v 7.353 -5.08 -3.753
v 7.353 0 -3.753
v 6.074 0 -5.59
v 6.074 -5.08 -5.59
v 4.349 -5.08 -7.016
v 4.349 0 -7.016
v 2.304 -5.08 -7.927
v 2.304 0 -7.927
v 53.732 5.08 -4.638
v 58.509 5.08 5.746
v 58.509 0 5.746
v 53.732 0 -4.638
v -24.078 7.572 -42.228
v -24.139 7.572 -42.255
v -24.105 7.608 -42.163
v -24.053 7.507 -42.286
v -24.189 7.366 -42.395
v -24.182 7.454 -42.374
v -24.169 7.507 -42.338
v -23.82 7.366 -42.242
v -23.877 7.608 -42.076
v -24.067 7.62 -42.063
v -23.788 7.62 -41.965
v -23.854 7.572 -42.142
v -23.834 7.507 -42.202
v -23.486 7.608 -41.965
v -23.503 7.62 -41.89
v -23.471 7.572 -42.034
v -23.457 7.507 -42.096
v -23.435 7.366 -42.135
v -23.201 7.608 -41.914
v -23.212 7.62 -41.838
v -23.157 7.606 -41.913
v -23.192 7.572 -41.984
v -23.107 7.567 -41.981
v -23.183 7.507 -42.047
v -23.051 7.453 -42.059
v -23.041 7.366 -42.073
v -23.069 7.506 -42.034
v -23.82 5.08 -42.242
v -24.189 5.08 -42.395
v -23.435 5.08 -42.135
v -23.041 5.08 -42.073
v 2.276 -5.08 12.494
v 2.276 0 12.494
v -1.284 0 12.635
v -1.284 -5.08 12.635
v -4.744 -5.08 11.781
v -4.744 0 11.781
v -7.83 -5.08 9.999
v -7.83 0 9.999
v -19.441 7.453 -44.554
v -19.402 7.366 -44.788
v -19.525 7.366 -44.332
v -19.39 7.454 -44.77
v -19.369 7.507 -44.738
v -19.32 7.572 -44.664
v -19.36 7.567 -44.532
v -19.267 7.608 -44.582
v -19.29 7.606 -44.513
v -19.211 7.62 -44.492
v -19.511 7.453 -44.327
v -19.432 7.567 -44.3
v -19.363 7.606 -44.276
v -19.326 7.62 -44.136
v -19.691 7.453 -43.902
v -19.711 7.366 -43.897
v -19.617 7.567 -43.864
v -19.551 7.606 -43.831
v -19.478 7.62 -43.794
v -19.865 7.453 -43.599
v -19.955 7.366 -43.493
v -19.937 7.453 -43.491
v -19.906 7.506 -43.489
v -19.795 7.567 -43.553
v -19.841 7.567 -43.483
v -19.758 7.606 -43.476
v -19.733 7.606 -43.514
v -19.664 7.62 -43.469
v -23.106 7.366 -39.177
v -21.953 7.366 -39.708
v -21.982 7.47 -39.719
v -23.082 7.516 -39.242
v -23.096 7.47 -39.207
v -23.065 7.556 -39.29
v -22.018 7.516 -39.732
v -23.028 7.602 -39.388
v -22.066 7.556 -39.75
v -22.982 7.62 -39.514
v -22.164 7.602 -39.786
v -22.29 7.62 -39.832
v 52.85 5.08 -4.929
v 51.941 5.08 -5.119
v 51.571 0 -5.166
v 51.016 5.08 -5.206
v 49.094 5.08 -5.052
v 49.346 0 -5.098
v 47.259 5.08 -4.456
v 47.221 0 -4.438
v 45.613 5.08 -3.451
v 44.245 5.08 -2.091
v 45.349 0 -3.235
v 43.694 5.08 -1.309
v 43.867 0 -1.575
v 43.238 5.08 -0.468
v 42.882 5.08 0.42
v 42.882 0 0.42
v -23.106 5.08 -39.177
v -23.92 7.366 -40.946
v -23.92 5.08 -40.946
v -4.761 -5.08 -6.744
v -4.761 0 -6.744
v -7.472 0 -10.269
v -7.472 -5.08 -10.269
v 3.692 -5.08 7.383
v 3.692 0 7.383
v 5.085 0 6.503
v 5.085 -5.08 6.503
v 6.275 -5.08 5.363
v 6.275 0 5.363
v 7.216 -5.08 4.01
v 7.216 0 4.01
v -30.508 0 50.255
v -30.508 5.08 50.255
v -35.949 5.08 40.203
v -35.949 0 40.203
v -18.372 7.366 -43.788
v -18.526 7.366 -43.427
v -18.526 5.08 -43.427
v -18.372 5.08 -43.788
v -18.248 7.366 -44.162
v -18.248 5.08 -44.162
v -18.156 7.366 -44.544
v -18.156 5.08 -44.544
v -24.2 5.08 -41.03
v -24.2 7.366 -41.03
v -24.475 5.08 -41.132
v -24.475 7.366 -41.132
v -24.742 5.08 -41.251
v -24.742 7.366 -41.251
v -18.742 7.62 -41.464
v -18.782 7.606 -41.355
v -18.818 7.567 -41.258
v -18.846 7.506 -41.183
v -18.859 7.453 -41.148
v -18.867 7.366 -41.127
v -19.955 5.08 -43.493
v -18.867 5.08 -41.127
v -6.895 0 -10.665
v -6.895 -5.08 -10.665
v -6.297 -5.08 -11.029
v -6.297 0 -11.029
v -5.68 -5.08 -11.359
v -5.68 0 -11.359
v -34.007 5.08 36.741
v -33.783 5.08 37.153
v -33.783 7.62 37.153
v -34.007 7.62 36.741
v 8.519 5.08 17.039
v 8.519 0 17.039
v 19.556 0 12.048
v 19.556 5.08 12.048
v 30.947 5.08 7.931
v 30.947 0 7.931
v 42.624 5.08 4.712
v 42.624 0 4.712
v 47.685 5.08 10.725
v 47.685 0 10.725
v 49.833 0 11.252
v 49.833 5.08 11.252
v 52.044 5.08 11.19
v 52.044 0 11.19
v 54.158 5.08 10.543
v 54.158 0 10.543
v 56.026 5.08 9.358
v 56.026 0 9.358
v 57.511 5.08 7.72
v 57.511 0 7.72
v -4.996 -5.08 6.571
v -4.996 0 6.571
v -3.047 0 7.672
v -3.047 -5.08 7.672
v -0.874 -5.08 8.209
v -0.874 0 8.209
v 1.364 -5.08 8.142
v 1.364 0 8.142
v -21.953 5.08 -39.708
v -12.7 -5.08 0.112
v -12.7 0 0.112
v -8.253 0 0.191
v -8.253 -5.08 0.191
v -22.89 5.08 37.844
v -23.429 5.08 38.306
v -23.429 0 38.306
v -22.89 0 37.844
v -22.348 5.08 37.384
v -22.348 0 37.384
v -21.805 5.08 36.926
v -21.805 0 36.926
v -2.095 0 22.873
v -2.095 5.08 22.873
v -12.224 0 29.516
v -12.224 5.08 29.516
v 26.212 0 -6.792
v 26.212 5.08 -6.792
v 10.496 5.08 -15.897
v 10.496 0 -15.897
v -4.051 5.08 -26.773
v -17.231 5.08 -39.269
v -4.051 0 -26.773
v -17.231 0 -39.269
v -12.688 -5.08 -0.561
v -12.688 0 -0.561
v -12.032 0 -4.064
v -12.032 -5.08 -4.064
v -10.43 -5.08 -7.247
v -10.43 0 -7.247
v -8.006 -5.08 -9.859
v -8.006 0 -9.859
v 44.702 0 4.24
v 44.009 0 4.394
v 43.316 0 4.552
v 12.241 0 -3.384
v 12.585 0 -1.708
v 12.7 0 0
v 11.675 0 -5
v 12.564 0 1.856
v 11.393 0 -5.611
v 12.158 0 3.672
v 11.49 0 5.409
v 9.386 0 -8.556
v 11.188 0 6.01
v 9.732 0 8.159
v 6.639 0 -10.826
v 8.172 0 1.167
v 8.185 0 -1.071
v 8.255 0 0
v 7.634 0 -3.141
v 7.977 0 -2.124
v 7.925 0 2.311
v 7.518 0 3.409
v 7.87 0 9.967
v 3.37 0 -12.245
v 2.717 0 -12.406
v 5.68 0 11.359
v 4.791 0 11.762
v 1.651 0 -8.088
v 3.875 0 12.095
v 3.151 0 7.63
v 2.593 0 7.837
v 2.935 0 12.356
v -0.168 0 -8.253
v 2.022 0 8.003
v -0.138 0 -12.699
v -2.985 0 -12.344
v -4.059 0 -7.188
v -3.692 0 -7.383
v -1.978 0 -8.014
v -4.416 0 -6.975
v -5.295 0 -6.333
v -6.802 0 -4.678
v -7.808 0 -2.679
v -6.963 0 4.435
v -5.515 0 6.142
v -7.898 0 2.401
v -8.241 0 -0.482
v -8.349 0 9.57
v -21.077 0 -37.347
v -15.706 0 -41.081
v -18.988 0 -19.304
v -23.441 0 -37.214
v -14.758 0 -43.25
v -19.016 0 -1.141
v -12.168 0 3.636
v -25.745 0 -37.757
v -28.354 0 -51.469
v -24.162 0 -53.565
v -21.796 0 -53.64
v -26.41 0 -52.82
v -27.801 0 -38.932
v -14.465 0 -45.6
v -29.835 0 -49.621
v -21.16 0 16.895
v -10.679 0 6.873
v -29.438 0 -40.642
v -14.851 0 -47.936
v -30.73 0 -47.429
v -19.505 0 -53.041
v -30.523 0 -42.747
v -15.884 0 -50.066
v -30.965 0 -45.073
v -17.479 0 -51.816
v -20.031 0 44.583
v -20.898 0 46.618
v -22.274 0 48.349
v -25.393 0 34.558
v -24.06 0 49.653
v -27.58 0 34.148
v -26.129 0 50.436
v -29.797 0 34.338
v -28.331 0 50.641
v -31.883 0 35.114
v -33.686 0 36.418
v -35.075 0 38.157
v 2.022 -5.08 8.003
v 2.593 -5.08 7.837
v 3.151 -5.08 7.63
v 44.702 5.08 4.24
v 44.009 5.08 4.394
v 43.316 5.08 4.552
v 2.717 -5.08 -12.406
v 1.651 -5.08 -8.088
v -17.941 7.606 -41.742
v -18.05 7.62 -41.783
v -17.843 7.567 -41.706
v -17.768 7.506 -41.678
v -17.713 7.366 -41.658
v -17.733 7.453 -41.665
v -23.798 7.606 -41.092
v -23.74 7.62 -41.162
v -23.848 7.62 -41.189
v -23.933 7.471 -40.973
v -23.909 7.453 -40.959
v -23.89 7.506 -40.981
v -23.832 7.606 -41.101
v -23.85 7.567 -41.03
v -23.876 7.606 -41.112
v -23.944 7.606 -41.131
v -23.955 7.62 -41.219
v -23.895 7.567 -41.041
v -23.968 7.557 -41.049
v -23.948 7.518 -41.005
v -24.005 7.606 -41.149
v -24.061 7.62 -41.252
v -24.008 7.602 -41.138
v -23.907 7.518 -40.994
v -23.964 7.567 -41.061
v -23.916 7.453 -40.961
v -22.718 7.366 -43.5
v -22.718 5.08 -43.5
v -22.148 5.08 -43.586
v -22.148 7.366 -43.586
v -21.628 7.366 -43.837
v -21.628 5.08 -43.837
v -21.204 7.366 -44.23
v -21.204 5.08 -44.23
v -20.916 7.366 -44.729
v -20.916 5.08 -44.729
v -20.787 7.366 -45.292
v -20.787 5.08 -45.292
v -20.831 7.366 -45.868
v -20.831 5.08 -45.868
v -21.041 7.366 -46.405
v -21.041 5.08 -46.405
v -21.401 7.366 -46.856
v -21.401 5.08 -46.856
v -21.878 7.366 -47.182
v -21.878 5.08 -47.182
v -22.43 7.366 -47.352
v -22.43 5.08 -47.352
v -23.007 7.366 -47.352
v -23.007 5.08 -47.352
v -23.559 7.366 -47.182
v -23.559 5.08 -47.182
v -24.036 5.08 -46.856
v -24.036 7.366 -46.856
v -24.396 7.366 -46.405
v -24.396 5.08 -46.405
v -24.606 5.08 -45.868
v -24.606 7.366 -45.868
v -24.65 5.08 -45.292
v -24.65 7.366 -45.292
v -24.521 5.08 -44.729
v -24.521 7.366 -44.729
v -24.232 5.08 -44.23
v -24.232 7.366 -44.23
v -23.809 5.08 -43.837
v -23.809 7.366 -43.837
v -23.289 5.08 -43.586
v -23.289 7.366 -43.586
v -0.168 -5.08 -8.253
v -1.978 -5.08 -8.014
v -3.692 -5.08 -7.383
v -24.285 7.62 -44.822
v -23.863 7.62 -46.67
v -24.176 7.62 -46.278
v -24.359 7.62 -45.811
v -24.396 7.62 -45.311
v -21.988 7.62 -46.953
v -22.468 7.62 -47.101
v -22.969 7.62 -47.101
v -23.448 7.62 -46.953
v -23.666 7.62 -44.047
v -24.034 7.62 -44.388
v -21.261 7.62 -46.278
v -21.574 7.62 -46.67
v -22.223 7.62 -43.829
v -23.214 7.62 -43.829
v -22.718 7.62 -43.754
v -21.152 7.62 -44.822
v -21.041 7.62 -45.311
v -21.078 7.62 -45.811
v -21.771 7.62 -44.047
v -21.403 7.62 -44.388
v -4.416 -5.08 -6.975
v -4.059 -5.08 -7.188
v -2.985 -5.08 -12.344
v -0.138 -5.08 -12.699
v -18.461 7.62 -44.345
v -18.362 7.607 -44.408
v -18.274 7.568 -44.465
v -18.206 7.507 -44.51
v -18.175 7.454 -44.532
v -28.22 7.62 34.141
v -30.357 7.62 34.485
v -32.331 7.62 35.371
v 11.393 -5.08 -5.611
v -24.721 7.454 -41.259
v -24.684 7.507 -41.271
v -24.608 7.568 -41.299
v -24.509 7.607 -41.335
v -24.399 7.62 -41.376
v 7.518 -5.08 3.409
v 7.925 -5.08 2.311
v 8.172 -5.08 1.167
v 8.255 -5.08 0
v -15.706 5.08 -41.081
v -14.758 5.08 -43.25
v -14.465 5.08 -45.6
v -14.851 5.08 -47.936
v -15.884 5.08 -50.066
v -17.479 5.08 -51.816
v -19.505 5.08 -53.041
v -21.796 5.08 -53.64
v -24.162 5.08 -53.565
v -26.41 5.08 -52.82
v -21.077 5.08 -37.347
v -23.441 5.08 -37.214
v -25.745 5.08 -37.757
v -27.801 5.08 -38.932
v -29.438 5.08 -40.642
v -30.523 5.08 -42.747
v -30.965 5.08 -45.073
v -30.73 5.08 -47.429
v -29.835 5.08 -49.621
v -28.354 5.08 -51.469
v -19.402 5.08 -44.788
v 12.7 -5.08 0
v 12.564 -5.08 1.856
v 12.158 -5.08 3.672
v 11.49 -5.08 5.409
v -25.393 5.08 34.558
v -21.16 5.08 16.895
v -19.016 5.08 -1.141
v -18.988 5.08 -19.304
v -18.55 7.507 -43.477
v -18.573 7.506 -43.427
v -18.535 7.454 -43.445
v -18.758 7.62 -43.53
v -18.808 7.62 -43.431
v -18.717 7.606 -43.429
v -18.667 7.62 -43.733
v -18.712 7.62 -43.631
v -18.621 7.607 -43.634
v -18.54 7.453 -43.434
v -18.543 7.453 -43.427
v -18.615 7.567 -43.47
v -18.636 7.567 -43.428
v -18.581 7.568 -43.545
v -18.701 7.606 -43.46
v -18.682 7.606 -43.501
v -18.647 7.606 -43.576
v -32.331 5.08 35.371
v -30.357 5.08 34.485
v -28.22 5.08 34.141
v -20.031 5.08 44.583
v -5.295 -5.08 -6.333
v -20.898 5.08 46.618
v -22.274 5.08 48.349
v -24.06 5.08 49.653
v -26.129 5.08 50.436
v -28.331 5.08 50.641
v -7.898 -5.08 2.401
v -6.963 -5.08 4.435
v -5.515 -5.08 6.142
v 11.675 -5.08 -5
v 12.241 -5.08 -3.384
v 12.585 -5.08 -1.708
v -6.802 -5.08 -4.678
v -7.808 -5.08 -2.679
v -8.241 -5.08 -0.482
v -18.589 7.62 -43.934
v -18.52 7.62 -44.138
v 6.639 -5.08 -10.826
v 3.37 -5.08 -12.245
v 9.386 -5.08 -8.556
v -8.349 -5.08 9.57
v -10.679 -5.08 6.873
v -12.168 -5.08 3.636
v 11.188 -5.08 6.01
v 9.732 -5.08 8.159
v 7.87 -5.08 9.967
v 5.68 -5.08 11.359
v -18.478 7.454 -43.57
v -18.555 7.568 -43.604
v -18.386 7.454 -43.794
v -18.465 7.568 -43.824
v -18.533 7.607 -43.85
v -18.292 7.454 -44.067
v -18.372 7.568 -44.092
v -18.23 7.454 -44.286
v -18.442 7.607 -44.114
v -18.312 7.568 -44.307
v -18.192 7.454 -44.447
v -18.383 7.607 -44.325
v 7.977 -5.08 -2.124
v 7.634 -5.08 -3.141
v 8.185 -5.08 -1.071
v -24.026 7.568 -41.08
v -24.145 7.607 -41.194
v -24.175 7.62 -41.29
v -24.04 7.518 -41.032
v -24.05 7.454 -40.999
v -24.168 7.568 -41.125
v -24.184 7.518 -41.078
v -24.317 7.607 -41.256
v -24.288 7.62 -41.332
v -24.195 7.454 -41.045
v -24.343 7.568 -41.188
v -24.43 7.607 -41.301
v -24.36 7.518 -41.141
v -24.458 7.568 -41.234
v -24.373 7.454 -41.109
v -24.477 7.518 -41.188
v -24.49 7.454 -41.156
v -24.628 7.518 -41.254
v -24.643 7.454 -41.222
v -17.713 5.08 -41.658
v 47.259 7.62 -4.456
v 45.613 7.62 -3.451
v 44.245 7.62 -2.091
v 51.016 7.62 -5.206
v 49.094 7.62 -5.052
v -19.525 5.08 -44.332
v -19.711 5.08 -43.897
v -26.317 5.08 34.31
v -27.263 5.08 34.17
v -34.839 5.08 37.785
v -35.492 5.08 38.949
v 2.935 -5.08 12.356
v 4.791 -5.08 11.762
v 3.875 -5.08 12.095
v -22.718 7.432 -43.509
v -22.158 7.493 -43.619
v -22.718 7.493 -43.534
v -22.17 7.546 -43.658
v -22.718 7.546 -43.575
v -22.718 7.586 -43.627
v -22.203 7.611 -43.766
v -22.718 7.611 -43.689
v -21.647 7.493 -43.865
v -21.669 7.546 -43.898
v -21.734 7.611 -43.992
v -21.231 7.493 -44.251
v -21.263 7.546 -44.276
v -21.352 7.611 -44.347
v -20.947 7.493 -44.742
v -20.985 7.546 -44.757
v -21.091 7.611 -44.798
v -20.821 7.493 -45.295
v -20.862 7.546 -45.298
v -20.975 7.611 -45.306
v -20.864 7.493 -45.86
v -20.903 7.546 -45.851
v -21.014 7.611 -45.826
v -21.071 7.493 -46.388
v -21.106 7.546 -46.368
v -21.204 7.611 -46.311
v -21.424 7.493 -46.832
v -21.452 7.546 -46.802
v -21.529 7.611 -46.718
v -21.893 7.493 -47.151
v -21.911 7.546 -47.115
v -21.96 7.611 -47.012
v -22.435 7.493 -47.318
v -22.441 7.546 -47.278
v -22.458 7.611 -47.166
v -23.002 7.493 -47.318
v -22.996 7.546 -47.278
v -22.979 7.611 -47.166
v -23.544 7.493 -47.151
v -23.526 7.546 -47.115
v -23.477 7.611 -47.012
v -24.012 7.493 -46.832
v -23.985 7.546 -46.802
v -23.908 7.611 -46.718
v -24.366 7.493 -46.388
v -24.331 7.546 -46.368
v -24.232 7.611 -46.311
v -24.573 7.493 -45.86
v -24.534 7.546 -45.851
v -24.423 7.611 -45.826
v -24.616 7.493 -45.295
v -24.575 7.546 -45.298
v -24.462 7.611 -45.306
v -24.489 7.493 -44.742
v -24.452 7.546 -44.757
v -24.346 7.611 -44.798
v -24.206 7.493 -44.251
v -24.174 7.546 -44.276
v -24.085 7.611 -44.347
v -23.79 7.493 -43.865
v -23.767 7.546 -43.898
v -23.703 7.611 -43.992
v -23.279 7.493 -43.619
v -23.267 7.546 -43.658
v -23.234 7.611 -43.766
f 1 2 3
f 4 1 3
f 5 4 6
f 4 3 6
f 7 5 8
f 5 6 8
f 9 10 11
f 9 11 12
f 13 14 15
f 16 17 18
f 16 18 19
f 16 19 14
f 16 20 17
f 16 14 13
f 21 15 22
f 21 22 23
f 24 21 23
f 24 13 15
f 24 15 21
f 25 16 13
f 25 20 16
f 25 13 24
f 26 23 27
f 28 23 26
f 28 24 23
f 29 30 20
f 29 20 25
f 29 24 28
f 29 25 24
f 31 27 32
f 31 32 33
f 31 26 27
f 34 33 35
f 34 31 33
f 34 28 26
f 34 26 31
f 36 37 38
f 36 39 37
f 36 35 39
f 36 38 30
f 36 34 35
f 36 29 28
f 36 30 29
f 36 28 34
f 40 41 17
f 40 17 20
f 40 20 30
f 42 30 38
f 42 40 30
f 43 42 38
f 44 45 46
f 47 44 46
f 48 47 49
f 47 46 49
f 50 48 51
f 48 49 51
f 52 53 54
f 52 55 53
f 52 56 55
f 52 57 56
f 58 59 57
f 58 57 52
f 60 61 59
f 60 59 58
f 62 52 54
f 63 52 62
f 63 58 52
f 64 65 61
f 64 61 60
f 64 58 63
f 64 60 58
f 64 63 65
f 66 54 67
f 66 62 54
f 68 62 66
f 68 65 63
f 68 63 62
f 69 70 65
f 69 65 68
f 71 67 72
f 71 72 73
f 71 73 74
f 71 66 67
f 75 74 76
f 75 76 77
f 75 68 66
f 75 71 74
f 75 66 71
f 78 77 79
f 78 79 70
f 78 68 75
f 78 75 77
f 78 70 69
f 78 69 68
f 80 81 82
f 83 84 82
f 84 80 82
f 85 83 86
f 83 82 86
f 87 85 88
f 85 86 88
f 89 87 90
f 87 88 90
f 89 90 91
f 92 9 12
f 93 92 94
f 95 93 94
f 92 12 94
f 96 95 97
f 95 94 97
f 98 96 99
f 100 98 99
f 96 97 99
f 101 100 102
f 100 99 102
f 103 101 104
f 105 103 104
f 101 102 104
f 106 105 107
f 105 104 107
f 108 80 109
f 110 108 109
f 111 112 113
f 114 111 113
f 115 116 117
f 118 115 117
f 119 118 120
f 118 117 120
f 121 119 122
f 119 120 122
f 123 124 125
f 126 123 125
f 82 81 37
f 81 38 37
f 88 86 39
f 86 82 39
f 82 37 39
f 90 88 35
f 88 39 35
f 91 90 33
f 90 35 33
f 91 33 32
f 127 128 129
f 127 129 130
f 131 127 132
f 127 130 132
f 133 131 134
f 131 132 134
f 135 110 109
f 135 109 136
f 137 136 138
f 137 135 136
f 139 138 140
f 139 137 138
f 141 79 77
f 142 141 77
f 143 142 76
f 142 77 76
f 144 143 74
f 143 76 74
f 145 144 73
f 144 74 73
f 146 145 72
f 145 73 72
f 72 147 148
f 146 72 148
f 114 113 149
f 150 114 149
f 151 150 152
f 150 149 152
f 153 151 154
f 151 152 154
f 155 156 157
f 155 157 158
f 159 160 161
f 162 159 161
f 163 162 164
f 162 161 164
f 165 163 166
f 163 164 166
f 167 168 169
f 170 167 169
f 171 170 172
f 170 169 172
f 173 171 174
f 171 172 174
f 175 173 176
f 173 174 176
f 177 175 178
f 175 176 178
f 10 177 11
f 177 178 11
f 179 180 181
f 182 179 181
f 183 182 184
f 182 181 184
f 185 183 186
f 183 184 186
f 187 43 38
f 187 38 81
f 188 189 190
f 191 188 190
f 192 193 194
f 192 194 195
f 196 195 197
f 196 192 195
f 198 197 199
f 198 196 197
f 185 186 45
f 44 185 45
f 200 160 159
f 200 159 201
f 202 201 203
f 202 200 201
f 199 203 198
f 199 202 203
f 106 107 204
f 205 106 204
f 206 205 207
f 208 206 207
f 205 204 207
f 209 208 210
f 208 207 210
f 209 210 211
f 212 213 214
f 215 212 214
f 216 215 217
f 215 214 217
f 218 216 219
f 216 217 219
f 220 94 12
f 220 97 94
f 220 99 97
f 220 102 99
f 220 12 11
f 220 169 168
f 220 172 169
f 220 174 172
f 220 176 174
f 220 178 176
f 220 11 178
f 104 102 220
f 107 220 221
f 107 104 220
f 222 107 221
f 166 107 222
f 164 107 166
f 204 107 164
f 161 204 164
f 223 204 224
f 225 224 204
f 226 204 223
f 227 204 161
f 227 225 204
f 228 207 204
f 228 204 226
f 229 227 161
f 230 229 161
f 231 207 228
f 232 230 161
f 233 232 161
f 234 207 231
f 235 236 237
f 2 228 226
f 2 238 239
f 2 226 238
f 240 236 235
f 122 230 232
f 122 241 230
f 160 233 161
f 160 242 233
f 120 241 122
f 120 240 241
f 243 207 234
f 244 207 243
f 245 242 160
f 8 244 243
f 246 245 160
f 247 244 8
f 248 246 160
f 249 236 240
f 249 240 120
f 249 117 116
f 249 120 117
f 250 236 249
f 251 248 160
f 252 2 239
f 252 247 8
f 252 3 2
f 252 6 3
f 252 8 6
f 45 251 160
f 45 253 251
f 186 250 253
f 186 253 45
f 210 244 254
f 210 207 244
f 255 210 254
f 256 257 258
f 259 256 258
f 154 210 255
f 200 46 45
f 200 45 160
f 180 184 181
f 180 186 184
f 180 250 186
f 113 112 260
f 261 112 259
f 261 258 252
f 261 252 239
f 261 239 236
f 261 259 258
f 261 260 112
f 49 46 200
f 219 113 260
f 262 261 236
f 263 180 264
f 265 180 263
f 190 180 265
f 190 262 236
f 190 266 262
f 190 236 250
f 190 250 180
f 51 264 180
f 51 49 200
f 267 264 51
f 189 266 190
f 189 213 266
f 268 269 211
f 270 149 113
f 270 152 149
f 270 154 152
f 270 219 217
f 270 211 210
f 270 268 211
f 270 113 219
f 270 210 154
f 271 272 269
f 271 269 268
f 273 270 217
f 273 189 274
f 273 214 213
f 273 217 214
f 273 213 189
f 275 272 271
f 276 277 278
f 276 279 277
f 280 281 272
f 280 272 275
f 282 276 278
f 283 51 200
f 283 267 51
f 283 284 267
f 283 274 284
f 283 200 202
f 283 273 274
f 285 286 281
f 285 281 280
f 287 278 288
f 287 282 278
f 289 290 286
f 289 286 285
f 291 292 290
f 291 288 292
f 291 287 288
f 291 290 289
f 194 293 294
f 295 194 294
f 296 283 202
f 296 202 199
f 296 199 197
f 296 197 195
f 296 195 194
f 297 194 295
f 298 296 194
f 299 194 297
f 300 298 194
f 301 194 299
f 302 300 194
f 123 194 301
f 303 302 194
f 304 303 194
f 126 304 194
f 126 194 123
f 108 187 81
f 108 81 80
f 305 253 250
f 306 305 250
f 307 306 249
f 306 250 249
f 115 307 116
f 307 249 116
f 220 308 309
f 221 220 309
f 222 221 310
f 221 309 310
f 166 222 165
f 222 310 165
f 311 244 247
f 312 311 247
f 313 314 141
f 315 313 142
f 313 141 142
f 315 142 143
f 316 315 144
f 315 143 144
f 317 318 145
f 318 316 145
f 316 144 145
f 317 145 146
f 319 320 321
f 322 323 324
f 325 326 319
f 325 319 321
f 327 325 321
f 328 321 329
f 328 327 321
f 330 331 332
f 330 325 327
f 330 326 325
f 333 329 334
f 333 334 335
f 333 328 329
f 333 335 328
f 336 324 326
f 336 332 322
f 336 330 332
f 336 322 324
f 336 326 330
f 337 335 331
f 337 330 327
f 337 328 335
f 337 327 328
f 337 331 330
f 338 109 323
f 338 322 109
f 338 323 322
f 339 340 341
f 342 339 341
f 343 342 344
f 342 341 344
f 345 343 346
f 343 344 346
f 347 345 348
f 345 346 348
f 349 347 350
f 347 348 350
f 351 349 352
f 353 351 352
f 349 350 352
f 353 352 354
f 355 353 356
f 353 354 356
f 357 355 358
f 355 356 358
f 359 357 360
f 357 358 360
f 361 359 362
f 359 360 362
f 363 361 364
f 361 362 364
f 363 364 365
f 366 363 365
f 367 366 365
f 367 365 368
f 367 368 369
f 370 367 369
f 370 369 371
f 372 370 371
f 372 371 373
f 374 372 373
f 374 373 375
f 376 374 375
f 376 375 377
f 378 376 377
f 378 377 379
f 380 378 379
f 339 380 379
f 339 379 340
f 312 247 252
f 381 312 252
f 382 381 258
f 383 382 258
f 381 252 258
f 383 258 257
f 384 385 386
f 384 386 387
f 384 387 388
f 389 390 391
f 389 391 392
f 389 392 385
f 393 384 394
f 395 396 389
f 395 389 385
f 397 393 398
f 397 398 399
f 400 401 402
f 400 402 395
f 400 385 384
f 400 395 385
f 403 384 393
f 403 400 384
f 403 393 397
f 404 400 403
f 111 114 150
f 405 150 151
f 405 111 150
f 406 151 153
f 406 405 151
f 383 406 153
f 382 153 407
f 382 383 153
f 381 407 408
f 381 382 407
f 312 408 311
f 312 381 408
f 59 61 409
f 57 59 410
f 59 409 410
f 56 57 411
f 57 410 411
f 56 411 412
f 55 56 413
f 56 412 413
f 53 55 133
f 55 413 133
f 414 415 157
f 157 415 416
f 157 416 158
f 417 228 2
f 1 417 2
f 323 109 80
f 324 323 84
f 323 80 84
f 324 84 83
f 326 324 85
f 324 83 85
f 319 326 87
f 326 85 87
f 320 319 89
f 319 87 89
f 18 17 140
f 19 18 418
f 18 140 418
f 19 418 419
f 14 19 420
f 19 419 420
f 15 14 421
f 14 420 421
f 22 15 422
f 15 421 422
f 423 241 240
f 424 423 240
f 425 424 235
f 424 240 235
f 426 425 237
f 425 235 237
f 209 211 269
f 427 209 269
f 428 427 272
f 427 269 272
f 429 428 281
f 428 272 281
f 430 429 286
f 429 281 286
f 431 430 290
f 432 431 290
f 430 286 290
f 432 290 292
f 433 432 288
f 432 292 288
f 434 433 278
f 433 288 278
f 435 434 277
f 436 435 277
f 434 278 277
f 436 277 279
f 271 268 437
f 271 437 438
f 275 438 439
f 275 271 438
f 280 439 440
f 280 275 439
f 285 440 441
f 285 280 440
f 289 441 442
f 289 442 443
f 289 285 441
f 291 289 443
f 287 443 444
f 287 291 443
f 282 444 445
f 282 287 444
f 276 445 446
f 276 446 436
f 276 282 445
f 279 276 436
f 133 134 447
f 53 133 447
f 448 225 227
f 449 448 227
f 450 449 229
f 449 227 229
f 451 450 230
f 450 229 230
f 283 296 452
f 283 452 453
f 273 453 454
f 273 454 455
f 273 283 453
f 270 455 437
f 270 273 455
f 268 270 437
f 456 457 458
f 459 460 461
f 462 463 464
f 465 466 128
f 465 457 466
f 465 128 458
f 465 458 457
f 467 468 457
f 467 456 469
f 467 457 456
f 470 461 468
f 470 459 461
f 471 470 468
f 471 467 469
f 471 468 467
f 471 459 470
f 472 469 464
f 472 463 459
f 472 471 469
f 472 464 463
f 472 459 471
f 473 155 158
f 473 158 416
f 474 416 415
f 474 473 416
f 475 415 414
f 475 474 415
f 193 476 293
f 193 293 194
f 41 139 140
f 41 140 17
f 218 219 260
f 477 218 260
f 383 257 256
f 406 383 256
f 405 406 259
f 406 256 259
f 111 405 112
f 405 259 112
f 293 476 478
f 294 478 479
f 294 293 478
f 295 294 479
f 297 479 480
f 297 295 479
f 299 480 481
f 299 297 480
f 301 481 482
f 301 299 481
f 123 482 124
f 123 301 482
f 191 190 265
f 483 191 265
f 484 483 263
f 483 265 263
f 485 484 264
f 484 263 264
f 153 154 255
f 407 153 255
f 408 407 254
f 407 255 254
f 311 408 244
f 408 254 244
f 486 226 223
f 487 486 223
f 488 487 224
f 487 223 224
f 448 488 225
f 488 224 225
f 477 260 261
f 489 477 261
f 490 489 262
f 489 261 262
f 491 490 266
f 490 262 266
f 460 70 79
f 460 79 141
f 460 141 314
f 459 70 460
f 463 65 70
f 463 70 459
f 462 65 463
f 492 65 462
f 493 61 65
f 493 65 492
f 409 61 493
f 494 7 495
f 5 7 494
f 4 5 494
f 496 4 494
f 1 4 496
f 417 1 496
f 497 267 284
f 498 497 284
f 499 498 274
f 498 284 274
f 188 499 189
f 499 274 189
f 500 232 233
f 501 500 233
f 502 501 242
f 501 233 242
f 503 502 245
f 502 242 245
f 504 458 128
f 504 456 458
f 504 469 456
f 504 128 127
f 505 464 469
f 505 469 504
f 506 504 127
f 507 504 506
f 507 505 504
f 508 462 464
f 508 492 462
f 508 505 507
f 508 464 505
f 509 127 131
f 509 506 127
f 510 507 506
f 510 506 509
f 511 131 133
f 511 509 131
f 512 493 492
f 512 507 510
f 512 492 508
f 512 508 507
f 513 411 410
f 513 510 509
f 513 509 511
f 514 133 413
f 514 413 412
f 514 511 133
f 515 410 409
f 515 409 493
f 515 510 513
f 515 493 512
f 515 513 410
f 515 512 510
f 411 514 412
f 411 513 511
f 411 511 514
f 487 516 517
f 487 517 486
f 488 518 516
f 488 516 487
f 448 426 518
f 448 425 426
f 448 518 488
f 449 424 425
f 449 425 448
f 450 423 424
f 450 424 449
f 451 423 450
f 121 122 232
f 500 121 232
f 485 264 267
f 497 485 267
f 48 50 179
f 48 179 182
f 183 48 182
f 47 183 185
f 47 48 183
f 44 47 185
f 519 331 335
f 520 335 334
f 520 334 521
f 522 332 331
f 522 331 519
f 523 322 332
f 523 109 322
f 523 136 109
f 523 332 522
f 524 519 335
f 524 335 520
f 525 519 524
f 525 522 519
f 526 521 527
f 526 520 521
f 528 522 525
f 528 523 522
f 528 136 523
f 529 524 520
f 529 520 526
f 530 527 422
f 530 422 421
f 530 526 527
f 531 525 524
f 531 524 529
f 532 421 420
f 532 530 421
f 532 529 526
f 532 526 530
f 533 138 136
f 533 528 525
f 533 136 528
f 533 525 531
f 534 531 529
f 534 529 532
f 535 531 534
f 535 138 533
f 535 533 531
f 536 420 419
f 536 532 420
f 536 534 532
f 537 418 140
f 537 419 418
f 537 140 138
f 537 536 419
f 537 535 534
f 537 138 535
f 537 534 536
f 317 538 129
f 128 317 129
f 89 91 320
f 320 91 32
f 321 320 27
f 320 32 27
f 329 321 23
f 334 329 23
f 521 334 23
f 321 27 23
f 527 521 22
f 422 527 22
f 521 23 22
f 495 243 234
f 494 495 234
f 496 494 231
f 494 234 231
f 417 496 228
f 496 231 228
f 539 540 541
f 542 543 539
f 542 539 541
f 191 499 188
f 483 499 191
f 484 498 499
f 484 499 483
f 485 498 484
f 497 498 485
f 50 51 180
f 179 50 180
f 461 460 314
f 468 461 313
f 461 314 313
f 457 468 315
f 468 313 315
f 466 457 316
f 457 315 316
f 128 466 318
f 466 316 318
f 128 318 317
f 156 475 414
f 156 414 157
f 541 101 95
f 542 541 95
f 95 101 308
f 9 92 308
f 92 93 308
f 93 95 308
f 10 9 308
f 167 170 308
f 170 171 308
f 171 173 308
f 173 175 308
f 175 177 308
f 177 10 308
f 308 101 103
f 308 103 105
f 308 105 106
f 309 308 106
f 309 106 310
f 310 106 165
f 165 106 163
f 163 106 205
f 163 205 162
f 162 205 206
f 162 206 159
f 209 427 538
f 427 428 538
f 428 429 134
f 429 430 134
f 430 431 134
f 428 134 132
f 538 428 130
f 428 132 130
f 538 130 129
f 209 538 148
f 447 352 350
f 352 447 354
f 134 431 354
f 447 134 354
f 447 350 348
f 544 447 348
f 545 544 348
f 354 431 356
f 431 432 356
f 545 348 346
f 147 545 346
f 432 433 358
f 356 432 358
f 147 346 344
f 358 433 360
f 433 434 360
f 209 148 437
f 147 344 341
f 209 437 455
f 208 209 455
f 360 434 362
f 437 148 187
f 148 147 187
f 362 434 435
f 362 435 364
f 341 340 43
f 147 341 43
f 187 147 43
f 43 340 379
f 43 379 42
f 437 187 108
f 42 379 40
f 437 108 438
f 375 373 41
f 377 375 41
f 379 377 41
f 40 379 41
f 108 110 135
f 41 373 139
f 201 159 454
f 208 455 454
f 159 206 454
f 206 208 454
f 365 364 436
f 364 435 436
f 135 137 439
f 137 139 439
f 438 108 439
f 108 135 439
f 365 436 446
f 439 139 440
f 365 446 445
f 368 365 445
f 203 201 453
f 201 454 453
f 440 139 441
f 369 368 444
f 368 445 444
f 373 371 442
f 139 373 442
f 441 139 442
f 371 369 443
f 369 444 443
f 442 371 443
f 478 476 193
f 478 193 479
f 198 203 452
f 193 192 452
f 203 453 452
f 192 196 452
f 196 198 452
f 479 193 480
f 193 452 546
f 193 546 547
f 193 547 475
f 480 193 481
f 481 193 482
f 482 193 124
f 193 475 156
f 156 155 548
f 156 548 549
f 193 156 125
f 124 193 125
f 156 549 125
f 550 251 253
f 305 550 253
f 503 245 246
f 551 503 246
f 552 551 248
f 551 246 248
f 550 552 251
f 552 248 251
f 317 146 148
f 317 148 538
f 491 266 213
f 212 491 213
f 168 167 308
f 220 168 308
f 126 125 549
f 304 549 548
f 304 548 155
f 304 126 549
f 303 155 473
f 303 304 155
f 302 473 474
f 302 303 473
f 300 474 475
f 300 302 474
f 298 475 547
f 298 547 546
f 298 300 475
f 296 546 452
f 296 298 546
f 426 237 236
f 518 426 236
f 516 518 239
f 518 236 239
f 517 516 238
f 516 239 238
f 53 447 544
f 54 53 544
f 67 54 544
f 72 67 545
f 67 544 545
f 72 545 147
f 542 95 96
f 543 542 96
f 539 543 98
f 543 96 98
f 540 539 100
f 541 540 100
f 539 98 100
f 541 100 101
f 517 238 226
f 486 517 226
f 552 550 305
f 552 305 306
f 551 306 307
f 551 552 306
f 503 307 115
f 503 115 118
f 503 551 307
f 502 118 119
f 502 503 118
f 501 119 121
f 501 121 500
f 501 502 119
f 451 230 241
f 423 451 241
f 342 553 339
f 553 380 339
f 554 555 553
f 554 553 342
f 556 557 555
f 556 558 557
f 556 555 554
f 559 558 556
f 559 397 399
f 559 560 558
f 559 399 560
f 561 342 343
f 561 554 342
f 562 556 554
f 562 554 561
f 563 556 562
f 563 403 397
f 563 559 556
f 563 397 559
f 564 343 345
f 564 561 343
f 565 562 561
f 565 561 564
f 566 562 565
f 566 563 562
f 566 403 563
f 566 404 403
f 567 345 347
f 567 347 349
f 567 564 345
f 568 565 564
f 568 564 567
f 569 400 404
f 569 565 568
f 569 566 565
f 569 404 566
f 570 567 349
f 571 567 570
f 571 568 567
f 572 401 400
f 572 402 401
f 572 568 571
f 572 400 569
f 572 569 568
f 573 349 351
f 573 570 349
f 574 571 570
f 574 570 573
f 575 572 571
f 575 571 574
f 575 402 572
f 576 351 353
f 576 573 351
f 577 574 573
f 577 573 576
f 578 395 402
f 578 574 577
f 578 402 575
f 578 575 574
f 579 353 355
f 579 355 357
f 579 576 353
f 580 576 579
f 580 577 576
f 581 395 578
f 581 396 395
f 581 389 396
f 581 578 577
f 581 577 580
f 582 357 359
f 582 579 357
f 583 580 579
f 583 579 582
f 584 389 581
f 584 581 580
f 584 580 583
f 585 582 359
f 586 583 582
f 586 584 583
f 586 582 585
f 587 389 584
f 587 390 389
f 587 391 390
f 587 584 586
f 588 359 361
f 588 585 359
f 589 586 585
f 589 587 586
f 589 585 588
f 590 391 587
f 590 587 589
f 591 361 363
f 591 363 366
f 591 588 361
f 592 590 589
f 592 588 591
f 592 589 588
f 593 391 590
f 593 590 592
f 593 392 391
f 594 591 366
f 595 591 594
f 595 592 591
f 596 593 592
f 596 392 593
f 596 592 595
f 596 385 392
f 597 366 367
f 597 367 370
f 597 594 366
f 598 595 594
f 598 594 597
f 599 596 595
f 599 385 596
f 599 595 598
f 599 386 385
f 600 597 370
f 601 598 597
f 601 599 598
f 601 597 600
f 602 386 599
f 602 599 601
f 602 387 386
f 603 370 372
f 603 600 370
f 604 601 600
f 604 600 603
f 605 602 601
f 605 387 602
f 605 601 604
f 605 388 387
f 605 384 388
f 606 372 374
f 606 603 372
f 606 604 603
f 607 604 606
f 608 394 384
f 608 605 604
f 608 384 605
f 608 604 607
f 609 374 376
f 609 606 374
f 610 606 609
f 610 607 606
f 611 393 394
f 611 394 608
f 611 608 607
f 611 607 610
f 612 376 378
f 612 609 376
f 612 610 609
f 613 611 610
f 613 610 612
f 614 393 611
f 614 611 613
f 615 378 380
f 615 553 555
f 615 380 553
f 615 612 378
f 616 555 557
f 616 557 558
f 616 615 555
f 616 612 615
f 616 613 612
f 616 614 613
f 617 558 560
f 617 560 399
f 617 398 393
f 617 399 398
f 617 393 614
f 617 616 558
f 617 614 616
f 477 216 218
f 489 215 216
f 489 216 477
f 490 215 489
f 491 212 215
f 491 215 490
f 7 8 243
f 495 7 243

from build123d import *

# Parameters (mm, degrees)
SKETCH2_R           = 8.255
BOSS_EXTRUDE1_DEPTH = 5.08
CUT_EXTRUDE1_DEPTH  = 80.908377803
BOSS_EXTRUDE2_DEPTH = 5.08
SKETCH8_R           = 1.9365
BOSS_EXTRUDE4_DEPTH = 2.54
FILLET1_R           = 0.254


with BuildPart() as part:
    # Sketch2 → Boss-Extrude1 (new body)
    with BuildSketch(Plane(origin=(0, 0, 0), x_dir=(1, 0, 0), z_dir=(0, 1, 0))):
        with Locations((50.708736123, -3.043695253)):
            Circle(SKETCH2_R)
        with BuildLine():
            Line((-26.410198882, 52.820397765), (8.519418994, -17.038837989))
            ThreePointArc((8.519418994, -17.038837989), (29.111674539, -8.526738277), (50.708736123, -3.043695253))
            ThreePointArc((50.708736123, -3.043695253), (13.970978455, 13.668941274), (-17.231396722, 39.269465517))
            ThreePointArc((-17.231396722, 39.269465517), (-15.883780079, 50.066404858), (-26.410198882, 52.820397765))
        make_face()
    boss_extrude1 = extrude(amount=BOSS_EXTRUDE1_DEPTH)

    # Sketch5 → Cut-Extrude1 (cut, through all)
    with BuildSketch(Plane(origin=(0, 5.08, 0), x_dir=(1, 0, 0), z_dir=(0, 1, 0))):
        with BuildLine():
            Line((58.508737367, -5.746472638), (53.73227101, 4.637662817))
            ThreePointArc((53.73227101, 4.637662817), (58.208389507, 0.405974894), (58.508737367, -5.746472638))
        make_face()
        with BuildLine():
            Line((47.685201237, -10.725053322), (44.702333378, -4.240237651))
            ThreePointArc((44.702333378, -4.240237651), (43.662385588, -4.472512868), (42.624053092, -4.711905455))
            ThreePointArc((42.624053092, -4.711905455), (44.393072013, -8.359465362), (47.685201237, -10.725053322))
        make_face()
    cut_extrude1 = extrude(amount=-CUT_EXTRUDE1_DEPTH, mode=Mode.SUBTRACT)

    # Mirror4: Boss-Extrude1, Cut-Extrude1 across plane
    add(boss_extrude1.mirror(Plane(origin=(0, 5.08, 0), x_dir=(0.4472135954999568, 0, 0.8944271909999164), z_dir=(0.8944271909999165, 0, -0.4472135954999568))))
    add(cut_extrude1.mirror(Plane(origin=(0, 5.08, 0), x_dir=(0.4472135954999568, 0, 0.8944271909999164), z_dir=(0.8944271909999165, 0, -0.4472135954999568))), mode=Mode.SUBTRACT)

    # Sketch3 → Boss-Extrude2 (add)
    with BuildSketch(Plane.XZ):
        with BuildLine():
            Line((-7.830396175, 9.998744708), (-4.996450265, 6.571187849))
            ThreePointArc((-4.996450265, 6.571187849), (-1.978896677, 8.01429928), (1.363556525, 8.141605407))
            Line((1.363556525, 8.141605407), (2.276392011, 12.494320286))
            ThreePointArc((2.276392011, 12.494320286), (-3.044456426, 12.329691199), (-7.830396175, 9.998744708))
        make_face()
        with BuildLine():
            Line((2.935161238, 12.356165607), (2.022325752, 8.003450728))
            ThreePointArc((2.022325752, 8.003450728), (2.873803437, 7.738622539), (3.691748231, 7.383496462))
            Line((3.691748231, 7.383496462), (5.679612663, 11.359225326))
            ThreePointArc((5.679612663, 11.359225326), (4.336133626, 11.936831455), (2.935161238, 12.356165607))
        make_face()
        with BuildLine():
            ThreePointArc((3.691748231, 7.383496462), (5.70850704, 5.963050593), (7.215527013, 4.010136523))
            Line((7.215527013, 4.010136523), (11.187760156, 6.010326339))
            ThreePointArc((11.187760156, 6.010326339), (8.847584221, 9.110996293), (5.679612663, 11.359225326))
            Line((5.679612663, 11.359225326), (3.691748231, 7.383496462))
        make_face()
        with BuildLine():
            ThreePointArc((8.255, 0), (8.09827691, -1.600917263), (7.63405849, -3.141046955))
            Line((7.63405849, -3.141046955), (11.674516714, -4.99956593))
            ThreePointArc((11.674516714, -4.99956593), (12.440987949, -2.551826574), (12.7, 0))
            ThreePointArc((12.7, 0), (12.39393251, 2.771360123), (11.490482373, 5.409141784))
            Line((11.490482373, 5.409141784), (7.51824923, 3.408951968))
            ThreePointArc((7.51824923, 3.408951968), (8.068710318, 1.743828777), (8.255, 0))
        make_face()
        with BuildLine():
            Line((11.393235918, -5.611076129), (7.352777693, -3.752557154))
            ThreePointArc((7.352777693, -3.752557154), (5.260198437, -6.362023059), (2.303988218, -7.92695801))
            Line((2.303988218, -7.92695801), (3.370124071, -12.244683081))
            ThreePointArc((3.370124071, -12.244683081), (8.092612979, -9.787727784), (11.393235918, -5.611076129))
        make_face()
        with BuildLine():
            Line((2.716650437, -12.406039271), (1.650514584, -8.088314201))
            ThreePointArc((1.650514584, -8.088314201), (-1.07974567, -8.18408054), (-3.691748231, -7.383496462))
            Line((-3.691748231, -7.383496462), (-5.679612663, -11.359225326))
            ThreePointArc((-5.679612663, -11.359225326), (-1.571222819, -12.602430672), (2.716650437, -12.406039271))
        make_face()
        with BuildLine():
            Line((-5.679612663, -11.359225326), (-3.691748231, -7.383496462))
            ThreePointArc((-3.691748231, -7.383496462), (-4.238479263, -7.083806783), (-4.761032175, -6.743708003))
            Line((-4.761032175, -6.743708003), (-7.472040736, -10.269304126))
            ThreePointArc((-7.472040736, -10.269304126), (-6.598369408, -10.851337298), (-5.679612663, -11.359225326))
        make_face()
        with BuildLine():
            Line((-8.005628232, -9.859001806), (-5.294619671, -6.333405683))
            ThreePointArc((-5.294619671, -6.333405683), (-7.373018127, -3.712630966), (-8.240898233, -0.482308323))
            Line((-8.240898233, -0.482308323), (-12.687606467, -0.560929709))
            ThreePointArc((-12.687606467, -0.560929709), (-11.343104811, -5.711739948), (-8.005628232, -9.859001806))
        make_face()
        with BuildLine():
            Line((-12.699505558, 0.112065107), (-8.252797323, 0.190686492))
            ThreePointArc((-8.252797323, 0.190686492), (-7.499653384, 3.449670147), (-5.515199838, 6.142279361))
            Line((-5.515199838, 6.142279361), (-8.349145748, 9.56983622))
            ThreePointArc((-8.349145748, 9.56983622), (-11.537928283, 5.307184842), (-12.699505558, 0.112065107))
        make_face()
    extrude(amount=BOSS_EXTRUDE2_DEPTH)

    # Sketch8 → Boss-Extrude4 (add)
    with BuildSketch(Plane(origin=(0, 5.08, 0), x_dir=(1, 0, 0), z_dir=(0, 1, 0))):
        with Locations(Location((-22.718450651, 45.436901303, 0), (0, 0, 270))):
            Circle(SKETCH8_R)
        with BuildLine():
            Line((44.245017522, 2.091026438), (51.016120308, 5.205579865))
            ThreePointArc((51.016120308, 5.205579865), (47.259065976, 4.455958131), (44.245017522, 2.091026438))
        make_face()
        with BuildLine():
            Line((-28.219831663, -34.141398155), (-33.783449428, -37.153243515))
            Line((-33.783449428, -37.153243515), (-34.006657305, -36.740923771))
            ThreePointArc((-34.006657305, -36.740923771), (-31.372925912, -34.863081971), (-28.219831663, -34.141398155))
        make_face()
        with BuildLine():
            Line((-23.106493475, 39.17694603), (-23.920173634, 40.945903321))
            ThreePointArc((-23.920173634, 40.945903321), (-24.338189112, 41.07918994), (-24.741778068, 41.25128938))
            Line((-24.741778068, 41.25128938), (-24.189051499, 42.394702403))
            ThreePointArc((-24.189051499, 42.394702403), (-23.62923703, 42.182963815), (-23.040846879, 42.073316657))
            Line((-23.040846879, 42.073316657), (-21.952700646, 39.707664514))
            Line((-21.952700646, 39.707664514), (-23.106493475, 39.17694603))
        make_face()
        with BuildLine():
            Line((-18.155964663, 44.544196083), (-19.402331023, 44.788062641))
            ThreePointArc((-19.402331023, 44.788062641), (-19.610293029, 44.111383595), (-19.954678188, 43.49288413))
            Line((-19.954678188, 43.49288413), (-18.866531955, 41.127231987))
            Line((-18.866531955, 41.127231987), (-17.712739127, 41.657950471))
            Line((-17.712739127, 41.657950471), (-18.526419286, 43.426907762))
            ThreePointArc((-18.526419286, 43.426907762), (-18.305687705, 43.97377992), (-18.155964663, 44.544196083))
        make_face()
    extrude(amount=BOSS_EXTRUDE4_DEPTH)

    # Fillet1
    # the kernel refuses this fillet: 0.254 mm, written as the material it takes off along each edge
    with BuildSketch(Plane(origin=(-22.718450651, 7.62, -45.436901303), x_dir=(0, 0, 1), z_dir=(-1, 0, 0))) as fillet1_piece_1:
        with BuildLine():
            CenterArc((1.9365 - FILLET1_R, -FILLET1_R), FILLET1_R, 0, 90)
            Line((1.9365 - FILLET1_R, 0), (1.9365, 0))
            Line((1.9365, 0), (1.9365, -FILLET1_R))
        make_face()
    revolve(axis=Axis((-22.718450651, 7.62, -45.436901303), (0, 1, 0)), mode=Mode.SUBTRACT)
    with BuildSketch(Plane(origin=(-22.718450651, 7.62, -45.436901303), x_dir=(0.8344364668114368, 0, 0.5511041488278291), z_dir=(-0.5511041488278291, 0, 0.8344364668114368))) as fillet1_piece_2_section:
        with BuildLine():
            CenterArc((4.649 - FILLET1_R, -FILLET1_R), FILLET1_R, 0, 90)
            Line((4.649 - FILLET1_R, 0), (4.649, 0))
            Line((4.649, 0), (4.649, -FILLET1_R))
        make_face()
    fillet1_piece_2 = revolve(axis=Axis((-22.718450651, 7.62, -45.436901303), (0, 1, 0)), revolution_arc=30.198076812, mode=Mode.PRIVATE)
    fillet1_piece_2 = split(fillet1_piece_2, bisect_by=Plane(origin=(-18.824875628, 7.561246822, -44.075757948), z_dir=(0.9084982899729419, 0, -0.4178885702148846)), keep=Keep.TOP, mode=Mode.PRIVATE)
    add(fillet1_piece_2, mode=Mode.SUBTRACT)
    with BuildSketch(Plane(origin=(-19.44342837, 7.62, -40.861872745), x_dir=(0, -1, 0), z_dir=(0.9084982899729457, 0, -0.4178885702148762)), Plane(origin=(-17.532781484, 7.62, -44.422262804), x_dir=(0, -1, 0), z_dir=(-0.9813908341478762, 0, -0.19202091201360277))) as fillet1_piece_3:
        with BuildLine():
            CenterArc((FILLET1_R, FILLET1_R), FILLET1_R, 180, 90)
            Line((0, FILLET1_R), (0, 0))
            Line((0, 0), (FILLET1_R, 0))
        make_face()
    extrude(amount=2.54, mode=Mode.SUBTRACT)
    with BuildSketch(Plane(origin=(-22.718450651, 7.62, -45.436901303), x_dir=(0.9999860071665359, 0, 0.005290129594736052), z_dir=(0.005290129594736052, 0, -0.9999860071665359))) as fillet1_piece_4:
        with BuildLine():
            CenterArc((3.379 + FILLET1_R, FILLET1_R), FILLET1_R, 180, 90)
            Line((3.379 + FILLET1_R, 0), (3.379, 0))
            Line((3.379, 0), (3.379, FILLET1_R))
        make_face()
    revolve(axis=Axis((-22.718450651, 7.62, -45.436901303), (0, -1, 0)), revolution_arc=45.586809734, mode=Mode.SUBTRACT)
    with BuildSketch(Plane(origin=(-20.22003743, 7.62, -44.069780544), x_dir=(0, -1, 0), z_dir=(0.41788857021487913, 0, 0.9084982899729444))) as fillet1_piece_5:
        with BuildLine():
            CenterArc((FILLET1_R, FILLET1_R), FILLET1_R, 180, 90)
            Line((0, FILLET1_R), (0, 0))
            Line((0, 0), (FILLET1_R, 0))
        make_face()
    extrude(amount=3.873914799, mode=Mode.SUBTRACT)
    with BuildSketch(Plane(origin=(-17.447379885, 7.62, -41.081054057), x_dir=(0, -1, 0), z_dir=(-0.41788857021488457, 0, -0.9084982899729418))) as fillet1_piece_6_section:
        with BuildLine():
            CenterArc((FILLET1_R, FILLET1_R), FILLET1_R, 180, 90)
            Line((0, FILLET1_R), (0, 0))
            Line((0, 0), (FILLET1_R, 0))
        make_face()
    fillet1_piece_6 = extrude(amount=3.217122312, mode=Mode.PRIVATE)
    fillet1_piece_6 = fillet1_piece_6 - Plane(origin=(-22.718450651, 7.561939846, -45.436901303), x_dir=(0.9017060368272567, 0, 0.43234965380960144), z_dir=(0, -1, 0)) * Cylinder(4.649, 8, mode=Mode.PRIVATE)
    add(fillet1_piece_6, mode=Mode.SUBTRACT)
    with BuildSketch(Plane(origin=(-25.018141353, 7.62, -40.679582869), x_dir=(0, -1, 0), z_dir=(0.43521777087784447, 0, -0.9003252145264622)), Plane(origin=(-21.375804232, 7.62, -39.973023756), x_dir=(0, -1, 0), z_dir=(-0.9084982899729452, 0, 0.41788857021487724))) as fillet1_piece_7:
        with BuildLine():
            CenterArc((FILLET1_R, -FILLET1_R), FILLET1_R, 90, 90)
            Line((0, -FILLET1_R), (0, 0))
            Line((0, 0), (FILLET1_R, 0))
        make_face()
    extrude(amount=2.54, mode=Mode.SUBTRACT)
    with BuildSketch(Plane(origin=(-22.841134233, 7.62, -38.600049616), x_dir=(0, -1, 0), z_dir=(-0.41788857021487996, 0, -0.908498289972944))) as fillet1_piece_8_section:
        with BuildLine():
            CenterArc((FILLET1_R, -FILLET1_R), FILLET1_R, 90, 90)
            Line((0, -FILLET1_R), (0, 0))
            Line((0, 0), (FILLET1_R, 0))
        make_face()
    fillet1_piece_8 = extrude(amount=3.217122312, mode=Mode.PRIVATE)
    fillet1_piece_8 = fillet1_piece_8 - Plane(origin=(-22.718450651, 7.561939847, -45.436901303), x_dir=(-0.2584906393546377, 0, 0.9660137625137806), z_dir=(0, -1, 0)) * Cylinder(4.649, 8, mode=Mode.PRIVATE)
    add(fillet1_piece_8, mode=Mode.SUBTRACT)
    with BuildSketch(Plane(origin=(-23.306206121, 7.62, -42.650213071), x_dir=(0, -1, 0), z_dir=(0.4178885702148779, 0, 0.9084982899729449))) as fillet1_piece_9:
        with BuildLine():
            CenterArc((FILLET1_R, -FILLET1_R), FILLET1_R, 90, 90)
            Line((0, -FILLET1_R), (0, 0))
            Line((0, 0), (FILLET1_R, 0))
        make_face()
    extrude(amount=3.873914799, mode=Mode.SUBTRACT)
    with BuildSketch(Plane(origin=(-22.718450651, 7.62, -45.436901303), x_dir=(-0.5957582628036739, 0, 0.8031638016626176), z_dir=(-0.8031638016626176, 0, -0.5957582628036739))) as fillet1_piece_10:
        with BuildLine():
            CenterArc((3.379 + FILLET1_R, -FILLET1_R), FILLET1_R, 90, 90)
            Line((3.379 + FILLET1_R, 0), (3.379, 0))
            Line((3.379, 0), (3.379, -FILLET1_R))
        make_face()
    revolve(axis=Axis((-22.718450651, 7.62, -45.436901303), (0, 1, 0)), revolution_arc=41.859242164, mode=Mode.SUBTRACT)
    with BuildSketch(Plane(origin=(-22.718450651, 7.62, -45.436901303), x_dir=(-0.12454585215970877, 0, 0.9922138533148043), z_dir=(0.9922138533148043, 0, 0.12454585215970877))) as fillet1_piece_11_section:
        with BuildLine():
            CenterArc((4.649 - FILLET1_R, FILLET1_R), FILLET1_R, 270, 90)
            Line((4.649 - FILLET1_R, 0), (4.649, 0))
            Line((4.649, 0), (4.649, FILLET1_R))
        make_face()
    fillet1_piece_11 = revolve(axis=Axis((-22.718450651, 7.62, -45.436901303), (0, -1, 0)), revolution_arc=26.47061248, mode=Mode.PRIVATE)
    fillet1_piece_11 = split(fillet1_piece_11, bisect_by=Plane(origin=(-24.16845647, 7.561068538, -41.485675279), z_dir=(-0.908498289972944, 0, 0.41788857021487996)), keep=Keep.TOP, mode=Mode.PRIVATE)
    add(fillet1_piece_11, mode=Mode.SUBTRACT)
    with BuildSketch(Plane(origin=(-17.447379885, 7.62, -41.081054057), x_dir=(0, -1, 0), z_dir=(-0.41788857021488457, 0, -0.9084982899729418))) as fillet1_piece_12a_section:
        with BuildLine():
            CenterArc((FILLET1_R, FILLET1_R), FILLET1_R, 180, 90)
            Line((0, FILLET1_R), (0, 0))
            Line((0, 0), (FILLET1_R, 0))
        make_face()
    fillet1_piece_12a = extrude(amount=3.217122312, mode=Mode.PRIVATE)
    fillet1_piece_12a = fillet1_piece_12a & Plane(origin=(-22.718450651, 7.564564402, -45.436901303), x_dir=(0.9017060368272567, 0, 0.43234965380960144), z_dir=(0, -1, 0)) * Cylinder(4.649, 8, mode=Mode.PRIVATE)
    with BuildSketch(Plane(origin=(-22.718450651, 7.62, -45.436901303), x_dir=(0.8344364668114368, 0, 0.5511041488278291), z_dir=(-0.5511041488278291, 0, 0.8344364668114368))) as fillet1_piece_12b_section:
        with BuildLine():
            CenterArc((4.649 - FILLET1_R, -FILLET1_R), FILLET1_R, 0, 90)
            Line((4.649 - FILLET1_R, 0), (4.649, 0))
            Line((4.649, 0), (4.649, -FILLET1_R))
        make_face()
    fillet1_piece_12b = revolve(axis=Axis((-22.718450651, 7.62, -45.436901303), (0, 1, 0)), revolution_arc=30.198076812, mode=Mode.PRIVATE)
    fillet1_piece_12b = split(fillet1_piece_12b, bisect_by=Plane(origin=(-18.473467876, 7.564339835, -43.311790315), z_dir=(-0.9084982899729419, 0, 0.4178885702148846)), keep=Keep.TOP, mode=Mode.PRIVATE)
    fillet1_piece_12 = fillet1_piece_12a & fillet1_piece_12b
    add(fillet1_piece_12, mode=Mode.SUBTRACT)
    with BuildSketch(Plane(origin=(-22.718450651, 7.62, -45.436901303), x_dir=(-0.12454585215970877, 0, 0.9922138533148043), z_dir=(0.9922138533148043, 0, 0.12454585215970877))) as fillet1_piece_13a_section:
        with BuildLine():
            CenterArc((4.649 - FILLET1_R, FILLET1_R), FILLET1_R, 270, 90)
            Line((4.649 - FILLET1_R, 0), (4.649, 0))
            Line((4.649, 0), (4.649, FILLET1_R))
        make_face()
    fillet1_piece_13a = revolve(axis=Axis((-22.718450651, 7.62, -45.436901303), (0, -1, 0)), revolution_arc=26.47061248, mode=Mode.PRIVATE)
    fillet1_piece_13a = split(fillet1_piece_13a, bisect_by=Plane(origin=(-23.86722258, 7.564339845, -40.830786649), z_dir=(0.908498289972944, 0, -0.41788857021487996)), keep=Keep.TOP, mode=Mode.PRIVATE)
    with BuildSketch(Plane(origin=(-22.841134233, 7.62, -38.600049616), x_dir=(0, -1, 0), z_dir=(-0.41788857021487996, 0, -0.908498289972944))) as fillet1_piece_13b_section:
        with BuildLine():
            CenterArc((FILLET1_R, -FILLET1_R), FILLET1_R, 90, 90)
            Line((0, -FILLET1_R), (0, 0))
            Line((0, 0), (FILLET1_R, 0))
        make_face()
    fillet1_piece_13b = extrude(amount=3.217122312, mode=Mode.PRIVATE)
    fillet1_piece_13b = fillet1_piece_13b & Plane(origin=(-22.718450651, 7.564564403, -45.436901303), x_dir=(-0.2584906393546377, 0, 0.9660137625137806), z_dir=(0, -1, 0)) * Cylinder(4.649, 8, mode=Mode.PRIVATE)
    fillet1_piece_13 = fillet1_piece_13a & fillet1_piece_13b
    add(fillet1_piece_13, mode=Mode.SUBTRACT)


solid = part.part
